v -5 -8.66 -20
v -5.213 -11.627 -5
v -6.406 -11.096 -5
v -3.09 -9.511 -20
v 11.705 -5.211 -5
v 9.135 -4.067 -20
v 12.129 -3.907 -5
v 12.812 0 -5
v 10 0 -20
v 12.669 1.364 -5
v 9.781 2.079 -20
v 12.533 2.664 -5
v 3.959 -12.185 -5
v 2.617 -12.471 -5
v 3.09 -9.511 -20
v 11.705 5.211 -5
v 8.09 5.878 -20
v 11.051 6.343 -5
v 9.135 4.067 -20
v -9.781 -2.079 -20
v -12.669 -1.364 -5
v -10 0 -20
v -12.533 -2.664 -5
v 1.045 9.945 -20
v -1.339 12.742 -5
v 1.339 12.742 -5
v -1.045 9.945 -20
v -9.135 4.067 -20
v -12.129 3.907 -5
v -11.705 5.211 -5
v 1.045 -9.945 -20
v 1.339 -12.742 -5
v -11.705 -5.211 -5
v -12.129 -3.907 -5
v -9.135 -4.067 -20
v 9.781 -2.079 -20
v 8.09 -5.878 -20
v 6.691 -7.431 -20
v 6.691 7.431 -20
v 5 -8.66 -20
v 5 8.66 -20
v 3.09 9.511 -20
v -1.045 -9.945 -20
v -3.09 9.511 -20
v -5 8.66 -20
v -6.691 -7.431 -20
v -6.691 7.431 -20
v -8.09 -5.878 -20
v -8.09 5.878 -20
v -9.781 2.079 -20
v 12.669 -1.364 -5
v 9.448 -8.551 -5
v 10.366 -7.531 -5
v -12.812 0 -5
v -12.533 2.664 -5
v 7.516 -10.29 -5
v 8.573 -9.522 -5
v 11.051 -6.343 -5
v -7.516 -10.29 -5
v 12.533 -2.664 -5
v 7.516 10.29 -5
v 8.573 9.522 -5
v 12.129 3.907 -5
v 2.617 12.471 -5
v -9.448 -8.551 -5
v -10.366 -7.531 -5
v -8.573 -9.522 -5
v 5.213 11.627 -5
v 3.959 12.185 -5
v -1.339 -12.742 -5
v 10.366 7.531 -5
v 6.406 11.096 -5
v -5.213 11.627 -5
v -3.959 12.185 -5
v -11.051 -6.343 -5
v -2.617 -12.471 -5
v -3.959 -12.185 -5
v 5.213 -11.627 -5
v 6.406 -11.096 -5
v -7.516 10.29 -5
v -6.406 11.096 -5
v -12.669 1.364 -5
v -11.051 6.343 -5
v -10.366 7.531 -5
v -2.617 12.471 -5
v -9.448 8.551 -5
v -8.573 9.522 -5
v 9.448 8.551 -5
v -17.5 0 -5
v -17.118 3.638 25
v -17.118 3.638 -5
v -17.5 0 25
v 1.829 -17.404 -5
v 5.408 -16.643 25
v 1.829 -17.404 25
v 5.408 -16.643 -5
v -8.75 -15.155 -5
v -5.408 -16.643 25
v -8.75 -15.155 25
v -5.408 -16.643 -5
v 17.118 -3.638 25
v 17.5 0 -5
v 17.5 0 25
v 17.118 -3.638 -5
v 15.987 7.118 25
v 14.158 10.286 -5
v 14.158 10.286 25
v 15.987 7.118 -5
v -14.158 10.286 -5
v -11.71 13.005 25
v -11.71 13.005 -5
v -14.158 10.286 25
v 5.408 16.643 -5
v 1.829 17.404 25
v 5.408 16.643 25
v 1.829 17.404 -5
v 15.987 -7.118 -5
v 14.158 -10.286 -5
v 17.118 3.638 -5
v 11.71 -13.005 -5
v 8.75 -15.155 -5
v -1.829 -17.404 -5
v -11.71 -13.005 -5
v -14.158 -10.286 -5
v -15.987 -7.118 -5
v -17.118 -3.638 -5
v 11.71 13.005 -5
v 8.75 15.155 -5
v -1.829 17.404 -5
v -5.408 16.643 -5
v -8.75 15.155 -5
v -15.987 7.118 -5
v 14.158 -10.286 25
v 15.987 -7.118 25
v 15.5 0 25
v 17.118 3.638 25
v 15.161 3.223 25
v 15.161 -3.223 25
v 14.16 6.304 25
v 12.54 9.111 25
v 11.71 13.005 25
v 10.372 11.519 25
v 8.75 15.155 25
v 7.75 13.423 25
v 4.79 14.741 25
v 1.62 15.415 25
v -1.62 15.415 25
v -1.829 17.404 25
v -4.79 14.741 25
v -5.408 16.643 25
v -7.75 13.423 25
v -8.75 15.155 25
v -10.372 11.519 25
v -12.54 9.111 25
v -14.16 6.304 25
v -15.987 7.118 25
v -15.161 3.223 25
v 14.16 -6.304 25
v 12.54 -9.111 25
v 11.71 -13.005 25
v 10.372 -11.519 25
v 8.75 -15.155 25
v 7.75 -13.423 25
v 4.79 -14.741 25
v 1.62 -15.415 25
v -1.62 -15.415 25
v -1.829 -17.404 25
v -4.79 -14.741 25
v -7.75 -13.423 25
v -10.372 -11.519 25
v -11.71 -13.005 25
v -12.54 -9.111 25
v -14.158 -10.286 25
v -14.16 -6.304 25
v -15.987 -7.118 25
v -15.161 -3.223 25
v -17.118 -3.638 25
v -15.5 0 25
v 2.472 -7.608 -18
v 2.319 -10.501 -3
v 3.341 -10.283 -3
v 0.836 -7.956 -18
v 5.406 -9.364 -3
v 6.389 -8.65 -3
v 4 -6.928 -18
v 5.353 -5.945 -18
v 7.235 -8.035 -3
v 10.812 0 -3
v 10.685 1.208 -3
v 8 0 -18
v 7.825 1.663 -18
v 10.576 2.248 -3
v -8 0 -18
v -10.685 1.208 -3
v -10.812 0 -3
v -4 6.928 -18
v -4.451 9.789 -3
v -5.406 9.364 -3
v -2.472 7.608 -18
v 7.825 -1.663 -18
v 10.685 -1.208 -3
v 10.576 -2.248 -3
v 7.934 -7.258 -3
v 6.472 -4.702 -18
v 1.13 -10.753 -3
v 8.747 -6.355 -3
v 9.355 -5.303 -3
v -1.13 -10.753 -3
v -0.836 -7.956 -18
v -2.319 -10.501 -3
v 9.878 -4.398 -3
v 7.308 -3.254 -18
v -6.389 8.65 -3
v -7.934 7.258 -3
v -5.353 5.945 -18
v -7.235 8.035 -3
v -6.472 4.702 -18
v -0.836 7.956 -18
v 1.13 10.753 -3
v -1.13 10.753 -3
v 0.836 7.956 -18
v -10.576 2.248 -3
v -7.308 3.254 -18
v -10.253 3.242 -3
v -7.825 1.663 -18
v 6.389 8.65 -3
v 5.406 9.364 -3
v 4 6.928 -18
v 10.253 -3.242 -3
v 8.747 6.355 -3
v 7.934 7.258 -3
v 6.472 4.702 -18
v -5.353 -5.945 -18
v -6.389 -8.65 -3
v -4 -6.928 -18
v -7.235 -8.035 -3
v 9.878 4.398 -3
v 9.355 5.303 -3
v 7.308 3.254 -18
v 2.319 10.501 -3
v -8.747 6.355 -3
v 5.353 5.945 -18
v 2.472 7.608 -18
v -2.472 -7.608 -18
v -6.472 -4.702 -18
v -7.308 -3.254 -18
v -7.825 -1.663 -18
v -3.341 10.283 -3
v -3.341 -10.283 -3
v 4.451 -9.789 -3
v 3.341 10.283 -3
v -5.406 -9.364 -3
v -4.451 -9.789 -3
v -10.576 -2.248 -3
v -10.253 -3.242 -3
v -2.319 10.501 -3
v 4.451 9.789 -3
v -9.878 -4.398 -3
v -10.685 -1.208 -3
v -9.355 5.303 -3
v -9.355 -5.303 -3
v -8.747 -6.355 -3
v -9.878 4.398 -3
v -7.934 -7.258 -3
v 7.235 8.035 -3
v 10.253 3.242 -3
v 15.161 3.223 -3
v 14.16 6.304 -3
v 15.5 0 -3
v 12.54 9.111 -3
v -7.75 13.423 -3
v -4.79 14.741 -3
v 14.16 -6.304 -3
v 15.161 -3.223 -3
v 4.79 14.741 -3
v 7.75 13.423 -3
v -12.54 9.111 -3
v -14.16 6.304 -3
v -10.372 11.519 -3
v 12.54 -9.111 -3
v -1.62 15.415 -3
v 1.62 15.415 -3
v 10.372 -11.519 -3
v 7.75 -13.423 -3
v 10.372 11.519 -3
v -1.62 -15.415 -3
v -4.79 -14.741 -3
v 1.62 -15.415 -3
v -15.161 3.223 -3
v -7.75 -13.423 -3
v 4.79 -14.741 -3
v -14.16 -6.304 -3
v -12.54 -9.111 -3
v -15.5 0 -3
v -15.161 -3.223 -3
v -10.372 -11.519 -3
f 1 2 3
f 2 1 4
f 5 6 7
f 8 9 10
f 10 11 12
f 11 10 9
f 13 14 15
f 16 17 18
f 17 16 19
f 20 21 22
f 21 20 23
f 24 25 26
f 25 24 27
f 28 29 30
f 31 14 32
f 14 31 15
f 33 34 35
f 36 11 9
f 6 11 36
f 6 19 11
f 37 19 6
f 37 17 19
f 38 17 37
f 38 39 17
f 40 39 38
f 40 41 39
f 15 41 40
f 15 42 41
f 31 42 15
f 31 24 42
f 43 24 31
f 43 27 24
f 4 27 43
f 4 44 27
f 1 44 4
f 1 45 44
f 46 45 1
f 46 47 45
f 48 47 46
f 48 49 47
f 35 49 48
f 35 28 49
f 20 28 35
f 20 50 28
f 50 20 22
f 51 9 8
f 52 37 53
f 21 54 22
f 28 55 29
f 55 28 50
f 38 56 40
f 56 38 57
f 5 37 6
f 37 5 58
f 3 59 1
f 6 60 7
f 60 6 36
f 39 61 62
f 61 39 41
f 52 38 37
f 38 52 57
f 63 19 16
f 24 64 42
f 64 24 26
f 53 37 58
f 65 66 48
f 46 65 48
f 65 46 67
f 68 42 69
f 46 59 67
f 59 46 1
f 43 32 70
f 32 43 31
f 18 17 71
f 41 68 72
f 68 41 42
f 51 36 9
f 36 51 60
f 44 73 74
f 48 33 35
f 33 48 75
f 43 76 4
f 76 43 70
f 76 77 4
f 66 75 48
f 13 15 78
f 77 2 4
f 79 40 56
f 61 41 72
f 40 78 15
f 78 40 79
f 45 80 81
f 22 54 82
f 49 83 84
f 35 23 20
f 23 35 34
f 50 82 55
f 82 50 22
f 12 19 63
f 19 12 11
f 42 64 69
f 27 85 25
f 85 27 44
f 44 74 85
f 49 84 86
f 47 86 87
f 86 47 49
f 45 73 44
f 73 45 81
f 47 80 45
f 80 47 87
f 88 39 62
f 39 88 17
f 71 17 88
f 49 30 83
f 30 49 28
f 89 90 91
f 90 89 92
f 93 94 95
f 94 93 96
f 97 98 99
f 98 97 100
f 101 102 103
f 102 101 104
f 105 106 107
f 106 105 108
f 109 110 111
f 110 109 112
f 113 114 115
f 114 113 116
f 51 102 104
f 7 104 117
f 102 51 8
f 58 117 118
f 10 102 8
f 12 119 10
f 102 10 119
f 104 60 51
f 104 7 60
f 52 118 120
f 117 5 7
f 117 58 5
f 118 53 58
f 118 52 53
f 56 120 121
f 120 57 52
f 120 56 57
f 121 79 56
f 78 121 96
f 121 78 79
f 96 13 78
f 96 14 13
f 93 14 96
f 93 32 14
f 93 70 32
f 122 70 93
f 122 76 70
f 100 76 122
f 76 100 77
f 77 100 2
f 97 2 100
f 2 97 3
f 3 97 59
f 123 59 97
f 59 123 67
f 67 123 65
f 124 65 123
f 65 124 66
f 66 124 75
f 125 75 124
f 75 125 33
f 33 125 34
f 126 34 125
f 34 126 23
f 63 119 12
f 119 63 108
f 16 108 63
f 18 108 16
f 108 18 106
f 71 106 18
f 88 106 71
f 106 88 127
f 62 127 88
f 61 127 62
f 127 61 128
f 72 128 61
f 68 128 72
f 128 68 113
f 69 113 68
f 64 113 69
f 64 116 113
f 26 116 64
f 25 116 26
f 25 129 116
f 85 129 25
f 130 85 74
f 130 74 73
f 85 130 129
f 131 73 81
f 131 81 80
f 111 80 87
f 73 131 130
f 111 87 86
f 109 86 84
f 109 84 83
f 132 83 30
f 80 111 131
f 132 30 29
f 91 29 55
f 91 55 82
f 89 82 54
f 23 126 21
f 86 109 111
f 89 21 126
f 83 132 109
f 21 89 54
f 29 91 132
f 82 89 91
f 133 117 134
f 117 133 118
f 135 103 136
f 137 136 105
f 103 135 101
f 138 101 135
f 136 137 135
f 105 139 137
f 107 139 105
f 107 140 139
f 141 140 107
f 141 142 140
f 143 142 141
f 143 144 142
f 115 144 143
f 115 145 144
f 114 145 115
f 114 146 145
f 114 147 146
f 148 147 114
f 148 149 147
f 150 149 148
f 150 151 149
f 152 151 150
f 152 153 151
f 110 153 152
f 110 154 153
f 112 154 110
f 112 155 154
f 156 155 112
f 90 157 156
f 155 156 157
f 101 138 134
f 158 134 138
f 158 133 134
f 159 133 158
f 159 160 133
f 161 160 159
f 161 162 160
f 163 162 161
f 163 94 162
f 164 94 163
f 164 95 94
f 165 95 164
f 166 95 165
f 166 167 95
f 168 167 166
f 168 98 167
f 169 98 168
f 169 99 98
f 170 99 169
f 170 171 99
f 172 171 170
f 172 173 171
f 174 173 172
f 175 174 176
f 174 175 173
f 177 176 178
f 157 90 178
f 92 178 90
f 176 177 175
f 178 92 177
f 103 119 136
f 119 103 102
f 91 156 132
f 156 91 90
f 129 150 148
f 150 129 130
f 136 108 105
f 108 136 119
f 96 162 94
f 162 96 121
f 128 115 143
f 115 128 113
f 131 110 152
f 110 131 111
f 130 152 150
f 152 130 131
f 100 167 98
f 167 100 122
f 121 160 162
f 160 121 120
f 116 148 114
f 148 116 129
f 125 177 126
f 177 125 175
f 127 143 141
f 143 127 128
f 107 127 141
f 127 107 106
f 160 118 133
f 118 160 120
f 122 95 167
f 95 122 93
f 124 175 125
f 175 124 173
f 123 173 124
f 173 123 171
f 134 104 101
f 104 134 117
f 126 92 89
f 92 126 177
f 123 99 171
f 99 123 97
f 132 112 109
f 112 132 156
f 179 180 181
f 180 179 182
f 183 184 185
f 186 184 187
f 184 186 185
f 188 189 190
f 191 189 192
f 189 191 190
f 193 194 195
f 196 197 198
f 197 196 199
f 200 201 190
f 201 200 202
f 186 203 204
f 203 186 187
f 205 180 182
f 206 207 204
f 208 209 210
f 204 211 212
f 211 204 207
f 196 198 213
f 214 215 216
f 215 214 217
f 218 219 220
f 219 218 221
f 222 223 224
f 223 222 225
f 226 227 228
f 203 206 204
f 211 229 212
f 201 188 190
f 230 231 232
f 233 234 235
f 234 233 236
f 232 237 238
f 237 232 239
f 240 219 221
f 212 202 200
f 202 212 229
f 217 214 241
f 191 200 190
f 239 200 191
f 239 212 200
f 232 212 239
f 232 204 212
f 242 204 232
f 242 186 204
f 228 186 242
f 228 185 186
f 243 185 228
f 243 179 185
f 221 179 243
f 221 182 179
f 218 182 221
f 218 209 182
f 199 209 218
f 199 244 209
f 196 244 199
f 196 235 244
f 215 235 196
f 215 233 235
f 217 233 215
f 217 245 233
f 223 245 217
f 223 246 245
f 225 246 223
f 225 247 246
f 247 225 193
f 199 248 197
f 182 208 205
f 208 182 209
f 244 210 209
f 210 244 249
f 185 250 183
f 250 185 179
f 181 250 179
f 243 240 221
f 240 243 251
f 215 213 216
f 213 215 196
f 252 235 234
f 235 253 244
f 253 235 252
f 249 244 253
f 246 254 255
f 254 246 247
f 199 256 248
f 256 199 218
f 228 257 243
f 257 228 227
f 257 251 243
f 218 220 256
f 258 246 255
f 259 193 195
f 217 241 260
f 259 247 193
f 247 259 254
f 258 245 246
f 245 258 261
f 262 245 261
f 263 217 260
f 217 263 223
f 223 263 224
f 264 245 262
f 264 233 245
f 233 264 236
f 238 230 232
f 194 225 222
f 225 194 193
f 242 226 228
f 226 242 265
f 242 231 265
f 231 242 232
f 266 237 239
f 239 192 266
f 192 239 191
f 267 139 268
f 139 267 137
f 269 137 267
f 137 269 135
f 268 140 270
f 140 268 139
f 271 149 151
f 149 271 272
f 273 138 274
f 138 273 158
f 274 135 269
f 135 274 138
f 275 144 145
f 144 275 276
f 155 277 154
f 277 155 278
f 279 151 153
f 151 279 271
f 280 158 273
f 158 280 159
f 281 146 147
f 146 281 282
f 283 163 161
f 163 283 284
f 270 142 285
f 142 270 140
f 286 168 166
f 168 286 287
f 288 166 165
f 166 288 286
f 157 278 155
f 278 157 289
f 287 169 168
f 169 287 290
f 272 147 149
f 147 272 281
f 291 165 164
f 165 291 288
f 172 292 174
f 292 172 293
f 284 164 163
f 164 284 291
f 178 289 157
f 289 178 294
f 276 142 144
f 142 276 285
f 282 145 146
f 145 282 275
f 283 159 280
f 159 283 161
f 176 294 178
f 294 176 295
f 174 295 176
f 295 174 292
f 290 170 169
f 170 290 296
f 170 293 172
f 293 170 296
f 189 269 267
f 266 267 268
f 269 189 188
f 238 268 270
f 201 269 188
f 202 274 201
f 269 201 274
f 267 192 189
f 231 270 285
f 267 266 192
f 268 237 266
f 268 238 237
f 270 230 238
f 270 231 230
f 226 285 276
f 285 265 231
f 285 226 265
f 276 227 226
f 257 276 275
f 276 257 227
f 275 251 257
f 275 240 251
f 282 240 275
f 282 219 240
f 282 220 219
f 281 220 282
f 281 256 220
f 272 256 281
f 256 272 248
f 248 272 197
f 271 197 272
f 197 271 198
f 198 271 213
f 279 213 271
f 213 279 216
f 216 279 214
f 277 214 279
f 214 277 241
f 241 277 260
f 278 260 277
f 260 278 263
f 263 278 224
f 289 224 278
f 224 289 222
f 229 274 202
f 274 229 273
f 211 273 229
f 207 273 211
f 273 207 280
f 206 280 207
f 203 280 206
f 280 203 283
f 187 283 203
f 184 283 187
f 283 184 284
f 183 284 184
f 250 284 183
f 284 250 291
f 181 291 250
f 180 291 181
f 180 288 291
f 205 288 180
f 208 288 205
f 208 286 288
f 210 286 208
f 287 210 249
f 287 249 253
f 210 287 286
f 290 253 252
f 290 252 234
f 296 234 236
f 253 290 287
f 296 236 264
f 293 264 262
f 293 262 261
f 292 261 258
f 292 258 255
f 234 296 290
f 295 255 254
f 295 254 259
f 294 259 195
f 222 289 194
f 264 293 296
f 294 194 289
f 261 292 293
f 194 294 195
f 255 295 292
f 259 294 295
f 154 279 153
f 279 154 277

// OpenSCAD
d=2;
g=10;
ht=30;
hb=10;

scale(1) {
minkowski() {
    difference() {
        union() {
            cylinder(h=hb+ht, r1=20/2, r2=35/2, center=true);
            translate([0, 0, hb]) cylinder(h=ht, r1=35/2, r2=35/2, center=true);
        }

        translate([0, 0, d]) cylinder(h=hb+ht, r1=20/2-d, r2=35/2-d, center=true);
        translate([0, 0, hb+d]) cylinder(h=ht, r1=35/2-d, r2=35/2-d, center=true);
    }

    *sphere(r=1);
}
}
